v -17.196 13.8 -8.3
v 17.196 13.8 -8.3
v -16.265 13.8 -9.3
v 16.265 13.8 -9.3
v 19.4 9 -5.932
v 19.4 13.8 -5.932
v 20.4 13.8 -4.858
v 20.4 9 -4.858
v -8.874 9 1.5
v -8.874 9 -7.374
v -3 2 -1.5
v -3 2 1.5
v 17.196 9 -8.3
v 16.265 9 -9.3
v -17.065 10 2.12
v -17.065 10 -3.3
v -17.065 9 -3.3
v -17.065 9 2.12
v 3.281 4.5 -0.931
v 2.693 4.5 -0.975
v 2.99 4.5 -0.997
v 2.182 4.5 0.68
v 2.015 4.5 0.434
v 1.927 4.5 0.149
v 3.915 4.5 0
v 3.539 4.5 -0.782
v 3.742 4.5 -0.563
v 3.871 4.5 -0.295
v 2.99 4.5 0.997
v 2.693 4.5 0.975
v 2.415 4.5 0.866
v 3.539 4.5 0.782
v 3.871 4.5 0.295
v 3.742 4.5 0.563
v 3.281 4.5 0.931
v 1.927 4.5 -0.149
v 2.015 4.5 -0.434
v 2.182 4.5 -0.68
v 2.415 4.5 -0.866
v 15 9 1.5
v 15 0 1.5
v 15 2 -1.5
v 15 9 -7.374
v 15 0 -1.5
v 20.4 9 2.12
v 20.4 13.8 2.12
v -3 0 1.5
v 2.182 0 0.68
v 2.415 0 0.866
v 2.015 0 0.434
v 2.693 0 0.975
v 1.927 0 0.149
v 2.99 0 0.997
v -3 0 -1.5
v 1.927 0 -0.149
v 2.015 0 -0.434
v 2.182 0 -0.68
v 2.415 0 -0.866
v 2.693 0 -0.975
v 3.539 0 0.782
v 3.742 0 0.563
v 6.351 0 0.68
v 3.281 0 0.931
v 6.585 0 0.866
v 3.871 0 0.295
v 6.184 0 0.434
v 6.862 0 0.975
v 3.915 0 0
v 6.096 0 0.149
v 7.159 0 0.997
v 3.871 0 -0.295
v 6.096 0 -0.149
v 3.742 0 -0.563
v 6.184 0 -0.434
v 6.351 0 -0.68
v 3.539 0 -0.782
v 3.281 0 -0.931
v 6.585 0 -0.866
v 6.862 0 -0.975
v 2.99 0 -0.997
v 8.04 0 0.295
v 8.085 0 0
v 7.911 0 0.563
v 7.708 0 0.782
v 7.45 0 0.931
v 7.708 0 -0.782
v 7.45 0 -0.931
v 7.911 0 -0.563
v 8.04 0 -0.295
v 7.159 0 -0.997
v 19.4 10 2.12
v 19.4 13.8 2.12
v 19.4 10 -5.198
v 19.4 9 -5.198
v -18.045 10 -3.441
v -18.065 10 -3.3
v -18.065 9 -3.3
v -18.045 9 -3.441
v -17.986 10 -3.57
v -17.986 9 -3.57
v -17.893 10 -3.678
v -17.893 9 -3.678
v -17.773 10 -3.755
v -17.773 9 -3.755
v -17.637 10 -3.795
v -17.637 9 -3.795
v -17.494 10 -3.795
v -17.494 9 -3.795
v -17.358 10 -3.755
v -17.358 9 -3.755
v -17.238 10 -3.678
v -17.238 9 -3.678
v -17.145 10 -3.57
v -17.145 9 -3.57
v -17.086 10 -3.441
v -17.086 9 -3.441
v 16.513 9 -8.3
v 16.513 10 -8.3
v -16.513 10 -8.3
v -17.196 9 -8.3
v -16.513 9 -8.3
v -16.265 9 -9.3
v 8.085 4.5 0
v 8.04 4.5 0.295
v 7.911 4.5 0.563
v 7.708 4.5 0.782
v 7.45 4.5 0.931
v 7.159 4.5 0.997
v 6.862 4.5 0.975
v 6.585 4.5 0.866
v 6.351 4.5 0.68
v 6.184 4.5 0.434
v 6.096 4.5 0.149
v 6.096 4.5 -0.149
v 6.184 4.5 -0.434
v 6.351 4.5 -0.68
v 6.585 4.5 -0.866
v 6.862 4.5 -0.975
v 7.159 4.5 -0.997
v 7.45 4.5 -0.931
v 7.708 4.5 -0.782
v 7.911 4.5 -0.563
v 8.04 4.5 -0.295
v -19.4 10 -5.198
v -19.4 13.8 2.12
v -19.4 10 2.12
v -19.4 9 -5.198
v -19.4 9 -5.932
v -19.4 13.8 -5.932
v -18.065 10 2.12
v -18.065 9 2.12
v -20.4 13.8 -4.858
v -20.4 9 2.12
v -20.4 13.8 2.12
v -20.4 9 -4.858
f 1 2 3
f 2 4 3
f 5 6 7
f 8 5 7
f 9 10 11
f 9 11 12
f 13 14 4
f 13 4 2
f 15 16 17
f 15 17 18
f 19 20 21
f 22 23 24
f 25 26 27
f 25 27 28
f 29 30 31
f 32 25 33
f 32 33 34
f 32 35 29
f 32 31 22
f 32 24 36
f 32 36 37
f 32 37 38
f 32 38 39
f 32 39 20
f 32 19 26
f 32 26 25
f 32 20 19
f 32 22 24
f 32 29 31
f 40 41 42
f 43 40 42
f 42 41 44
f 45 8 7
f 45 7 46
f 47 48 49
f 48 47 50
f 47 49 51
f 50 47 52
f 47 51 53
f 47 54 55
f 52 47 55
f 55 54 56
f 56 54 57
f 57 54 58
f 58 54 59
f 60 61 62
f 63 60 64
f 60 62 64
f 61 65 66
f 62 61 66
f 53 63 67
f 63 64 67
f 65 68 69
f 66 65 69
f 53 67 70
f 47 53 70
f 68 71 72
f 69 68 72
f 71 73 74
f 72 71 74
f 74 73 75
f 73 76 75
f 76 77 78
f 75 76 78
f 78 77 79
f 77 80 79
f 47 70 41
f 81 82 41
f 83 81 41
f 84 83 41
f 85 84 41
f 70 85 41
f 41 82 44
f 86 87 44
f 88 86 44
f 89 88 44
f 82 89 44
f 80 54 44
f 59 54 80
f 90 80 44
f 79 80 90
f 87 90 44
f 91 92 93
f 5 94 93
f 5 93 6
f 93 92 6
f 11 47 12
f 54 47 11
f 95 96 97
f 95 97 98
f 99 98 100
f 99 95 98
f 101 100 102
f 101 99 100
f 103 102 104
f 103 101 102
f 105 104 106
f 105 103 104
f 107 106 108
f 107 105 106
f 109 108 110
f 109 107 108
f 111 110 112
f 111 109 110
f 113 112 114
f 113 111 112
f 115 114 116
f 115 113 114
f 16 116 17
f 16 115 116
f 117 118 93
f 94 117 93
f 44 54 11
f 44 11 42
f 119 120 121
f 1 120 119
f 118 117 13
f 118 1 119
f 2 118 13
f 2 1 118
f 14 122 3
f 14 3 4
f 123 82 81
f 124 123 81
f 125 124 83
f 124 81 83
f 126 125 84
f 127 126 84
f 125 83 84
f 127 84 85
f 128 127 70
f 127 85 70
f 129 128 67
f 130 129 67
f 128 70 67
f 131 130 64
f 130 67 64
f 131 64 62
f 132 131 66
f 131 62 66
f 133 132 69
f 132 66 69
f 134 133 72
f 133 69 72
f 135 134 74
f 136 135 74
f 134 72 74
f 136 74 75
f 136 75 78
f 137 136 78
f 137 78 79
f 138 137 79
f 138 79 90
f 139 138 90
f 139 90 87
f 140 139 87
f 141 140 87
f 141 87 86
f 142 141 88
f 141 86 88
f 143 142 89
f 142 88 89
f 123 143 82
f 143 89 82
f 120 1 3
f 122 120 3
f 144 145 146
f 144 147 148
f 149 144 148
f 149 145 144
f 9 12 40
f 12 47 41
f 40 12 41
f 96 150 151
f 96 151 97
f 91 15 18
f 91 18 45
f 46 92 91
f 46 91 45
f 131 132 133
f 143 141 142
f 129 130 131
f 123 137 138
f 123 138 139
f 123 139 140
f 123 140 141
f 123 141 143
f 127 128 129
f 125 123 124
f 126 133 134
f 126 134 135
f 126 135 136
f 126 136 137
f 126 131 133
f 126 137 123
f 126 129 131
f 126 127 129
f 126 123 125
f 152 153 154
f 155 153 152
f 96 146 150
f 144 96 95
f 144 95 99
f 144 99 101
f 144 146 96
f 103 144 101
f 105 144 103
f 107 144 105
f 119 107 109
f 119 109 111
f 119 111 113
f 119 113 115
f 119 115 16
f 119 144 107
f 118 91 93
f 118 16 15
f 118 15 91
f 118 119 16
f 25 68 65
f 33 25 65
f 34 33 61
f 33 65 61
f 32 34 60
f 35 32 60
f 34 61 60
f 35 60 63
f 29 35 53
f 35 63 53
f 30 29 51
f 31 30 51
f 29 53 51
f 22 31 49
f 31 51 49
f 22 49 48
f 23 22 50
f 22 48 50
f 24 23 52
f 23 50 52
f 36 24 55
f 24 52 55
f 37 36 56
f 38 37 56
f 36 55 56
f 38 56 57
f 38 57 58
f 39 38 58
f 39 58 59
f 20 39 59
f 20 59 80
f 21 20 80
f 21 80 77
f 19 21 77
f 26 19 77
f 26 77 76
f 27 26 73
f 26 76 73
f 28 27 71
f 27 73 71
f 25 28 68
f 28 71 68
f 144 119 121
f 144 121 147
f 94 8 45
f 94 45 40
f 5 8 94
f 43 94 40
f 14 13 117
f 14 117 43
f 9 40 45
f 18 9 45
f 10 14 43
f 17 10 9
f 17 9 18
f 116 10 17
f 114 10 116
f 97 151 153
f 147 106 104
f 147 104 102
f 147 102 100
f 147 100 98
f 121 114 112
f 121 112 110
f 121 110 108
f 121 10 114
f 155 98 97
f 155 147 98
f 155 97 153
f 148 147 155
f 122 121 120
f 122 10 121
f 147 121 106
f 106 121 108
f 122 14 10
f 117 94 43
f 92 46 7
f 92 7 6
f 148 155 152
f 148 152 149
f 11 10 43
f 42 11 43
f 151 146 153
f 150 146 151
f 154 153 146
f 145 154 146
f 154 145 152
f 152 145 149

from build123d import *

# Parameters (mm, degrees)
SKETCH1_W             = 18
SKETCH1_H             = 3
BOSS_EXTRUDE1_DEPTH   = 9
BOSS_EXTRUDE2_DEPTH   = 4.8
CUT_EXTRUDE2_DEPTH    = 3.8
CUT_EXTRUDE3_DEPTH    = 6
CUT_EXTRUDE4_DEPTH    = 6.9
CUT_EXTRUDE5_DEPTH    = 4.5
SKETCH9_R             = 1
CUT_EXTRUDE6_DEPTH    = 4.5
SKETCH12_W            = 40.8
SKETCH12_H            = 4.8
CUT_EXTRUDE8_DEPTH    = 1.5
CHAMFER9_SIZE         = 7
CHAMFER9_SIZE2        = 5.873697418
CHAMFER9_PART_2_SIZE  = 7
CHAMFER9_PART_2_SIZE2 = 5.873697418


with BuildPart() as part:
    # Sketch1 → Boss-Extrude1 (new body)
    with BuildSketch(Plane(origin=(0, 0, 0), x_dir=(1, 0, 0), z_dir=(0, 1, 0))):
        with Locations((6, 0)):
            Rectangle(SKETCH1_W, SKETCH1_H)
    extrude(amount=BOSS_EXTRUDE1_DEPTH)

    # Sketch4 → Boss-Extrude2 (add)
    with BuildSketch(Plane(origin=(0, 9, 0), x_dir=(1, 0, 0), z_dir=(0, 1, 0))):
        Polygon((-16.265306784, 9.3), (16.265306784, 9.3), (20.4, 4.858031992), (20.4, -4.620102593), (-20.4, -4.620102593), (-20.4, 4.858031992), align=None)
    extrude(amount=BOSS_EXTRUDE2_DEPTH)

    # Sketch5 → Cut-Extrude2 (cut)
    with BuildSketch(Plane(origin=(0, 13.8, 0), x_dir=(1, 0, 0), z_dir=(0, 1, 0))):
        Polygon((16.513043846, 8.3), (-16.513043846, 8.3), (-19.4, 5.198496162), (-19.4, -3.620102593), (19.4, -3.620102593), (19.4, 5.198496162), align=None)
    extrude(amount=-CUT_EXTRUDE2_DEPTH, mode=Mode.SUBTRACT)

    # Sketch5<3> → Cut-Extrude3 (cut)
    with BuildSketch(Plane(origin=(0, 13.8, 0), x_dir=(1, 0, 0), z_dir=(0, 1, 0))):
        Polygon((20.4, -3.620102593), (19.4, -3.620102593), (-19.4, -3.620102593), (-20.4, -3.620102593), (-20.4, -4.620102593), (20.4, -4.620102593), align=None)
    extrude(amount=-CUT_EXTRUDE3_DEPTH, mode=Mode.SUBTRACT)

    # Sketch6 → Cut-Extrude4 (cut)
    with BuildSketch(Plane(origin=(0, 13.8, 0), x_dir=(1, 0, 0), z_dir=(0, 1, 0))):
        Polygon((-19.4, 5.198496162), (-19.4, 8.3), (-16.513043846, 8.3), align=None)
        Polygon((16.513043846, 8.3), (19.4, 5.198496162), (19.4, 8.3), align=None)
    extrude(amount=-CUT_EXTRUDE4_DEPTH, mode=Mode.SUBTRACT)

    # Sketch8 → Cut-Extrude5 (cut)
    with BuildSketch(Plane(origin=(0, 10, 0), x_dir=(1, 0, 0), z_dir=(0, 1, 0))):
        with BuildLine():
            Line((-17.065370438, 3.3), (-17.065370438, -4.992630539))
            ThreePointArc((-17.065370438, -4.992630539), (-17.565370438, -5.492630539), (-18.065370438, -4.992630539))
            Line((-18.065370438, -4.992630539), (-18.065370438, 3.3))
            ThreePointArc((-18.065370438, 3.3), (-17.565370438, 3.8), (-17.065370438, 3.3))
        make_face()
    extrude(amount=-CUT_EXTRUDE5_DEPTH, mode=Mode.SUBTRACT)

    # Sketch9 → Cut-Extrude6 (cut)
    with BuildSketch(Plane.XZ):
        with Locations((2.915469811, 0)):
            Circle(SKETCH9_R)
        with Locations((7.084530189, 0)):
            Circle(SKETCH9_R)
    extrude(amount=-CUT_EXTRUDE6_DEPTH, mode=Mode.SUBTRACT)

    # Sketch12 → Cut-Extrude8 (cut)
    with BuildSketch(Plane.XY.offset(3.620102593)):
        with Locations((0, 11.4)):
            Rectangle(SKETCH12_W, SKETCH12_H)
    extrude(amount=-CUT_EXTRUDE8_DEPTH, mode=Mode.SUBTRACT)

    # Chamfer9
    chamfer9_edges = [part.edges().sort_by_distance(p)[0] for p in [
        (6, 9, -1.5),
    ]]
    chamfer9_side = [part.faces().sort_by_distance(p)[0] for p in [
        (6, 4.5, -1.5),
    ]]
    chamfer(chamfer9_edges, length=CHAMFER9_SIZE, length2=CHAMFER9_SIZE2, reference=chamfer9_side[0])

    # Chamfer9 part 2
    chamfer9_part_2_edges = [part.edges().sort_by_distance(p)[0] for p in [
        (-3, 9, 0),
    ]]
    chamfer9_part_2_side = [part.faces().sort_by_distance(p)[0] for p in [
        (-3, 4.5, 0),
    ]]
    chamfer(chamfer9_part_2_edges, length=CHAMFER9_PART_2_SIZE, length2=CHAMFER9_PART_2_SIZE2, reference=chamfer9_part_2_side[0])


solid = part.part
